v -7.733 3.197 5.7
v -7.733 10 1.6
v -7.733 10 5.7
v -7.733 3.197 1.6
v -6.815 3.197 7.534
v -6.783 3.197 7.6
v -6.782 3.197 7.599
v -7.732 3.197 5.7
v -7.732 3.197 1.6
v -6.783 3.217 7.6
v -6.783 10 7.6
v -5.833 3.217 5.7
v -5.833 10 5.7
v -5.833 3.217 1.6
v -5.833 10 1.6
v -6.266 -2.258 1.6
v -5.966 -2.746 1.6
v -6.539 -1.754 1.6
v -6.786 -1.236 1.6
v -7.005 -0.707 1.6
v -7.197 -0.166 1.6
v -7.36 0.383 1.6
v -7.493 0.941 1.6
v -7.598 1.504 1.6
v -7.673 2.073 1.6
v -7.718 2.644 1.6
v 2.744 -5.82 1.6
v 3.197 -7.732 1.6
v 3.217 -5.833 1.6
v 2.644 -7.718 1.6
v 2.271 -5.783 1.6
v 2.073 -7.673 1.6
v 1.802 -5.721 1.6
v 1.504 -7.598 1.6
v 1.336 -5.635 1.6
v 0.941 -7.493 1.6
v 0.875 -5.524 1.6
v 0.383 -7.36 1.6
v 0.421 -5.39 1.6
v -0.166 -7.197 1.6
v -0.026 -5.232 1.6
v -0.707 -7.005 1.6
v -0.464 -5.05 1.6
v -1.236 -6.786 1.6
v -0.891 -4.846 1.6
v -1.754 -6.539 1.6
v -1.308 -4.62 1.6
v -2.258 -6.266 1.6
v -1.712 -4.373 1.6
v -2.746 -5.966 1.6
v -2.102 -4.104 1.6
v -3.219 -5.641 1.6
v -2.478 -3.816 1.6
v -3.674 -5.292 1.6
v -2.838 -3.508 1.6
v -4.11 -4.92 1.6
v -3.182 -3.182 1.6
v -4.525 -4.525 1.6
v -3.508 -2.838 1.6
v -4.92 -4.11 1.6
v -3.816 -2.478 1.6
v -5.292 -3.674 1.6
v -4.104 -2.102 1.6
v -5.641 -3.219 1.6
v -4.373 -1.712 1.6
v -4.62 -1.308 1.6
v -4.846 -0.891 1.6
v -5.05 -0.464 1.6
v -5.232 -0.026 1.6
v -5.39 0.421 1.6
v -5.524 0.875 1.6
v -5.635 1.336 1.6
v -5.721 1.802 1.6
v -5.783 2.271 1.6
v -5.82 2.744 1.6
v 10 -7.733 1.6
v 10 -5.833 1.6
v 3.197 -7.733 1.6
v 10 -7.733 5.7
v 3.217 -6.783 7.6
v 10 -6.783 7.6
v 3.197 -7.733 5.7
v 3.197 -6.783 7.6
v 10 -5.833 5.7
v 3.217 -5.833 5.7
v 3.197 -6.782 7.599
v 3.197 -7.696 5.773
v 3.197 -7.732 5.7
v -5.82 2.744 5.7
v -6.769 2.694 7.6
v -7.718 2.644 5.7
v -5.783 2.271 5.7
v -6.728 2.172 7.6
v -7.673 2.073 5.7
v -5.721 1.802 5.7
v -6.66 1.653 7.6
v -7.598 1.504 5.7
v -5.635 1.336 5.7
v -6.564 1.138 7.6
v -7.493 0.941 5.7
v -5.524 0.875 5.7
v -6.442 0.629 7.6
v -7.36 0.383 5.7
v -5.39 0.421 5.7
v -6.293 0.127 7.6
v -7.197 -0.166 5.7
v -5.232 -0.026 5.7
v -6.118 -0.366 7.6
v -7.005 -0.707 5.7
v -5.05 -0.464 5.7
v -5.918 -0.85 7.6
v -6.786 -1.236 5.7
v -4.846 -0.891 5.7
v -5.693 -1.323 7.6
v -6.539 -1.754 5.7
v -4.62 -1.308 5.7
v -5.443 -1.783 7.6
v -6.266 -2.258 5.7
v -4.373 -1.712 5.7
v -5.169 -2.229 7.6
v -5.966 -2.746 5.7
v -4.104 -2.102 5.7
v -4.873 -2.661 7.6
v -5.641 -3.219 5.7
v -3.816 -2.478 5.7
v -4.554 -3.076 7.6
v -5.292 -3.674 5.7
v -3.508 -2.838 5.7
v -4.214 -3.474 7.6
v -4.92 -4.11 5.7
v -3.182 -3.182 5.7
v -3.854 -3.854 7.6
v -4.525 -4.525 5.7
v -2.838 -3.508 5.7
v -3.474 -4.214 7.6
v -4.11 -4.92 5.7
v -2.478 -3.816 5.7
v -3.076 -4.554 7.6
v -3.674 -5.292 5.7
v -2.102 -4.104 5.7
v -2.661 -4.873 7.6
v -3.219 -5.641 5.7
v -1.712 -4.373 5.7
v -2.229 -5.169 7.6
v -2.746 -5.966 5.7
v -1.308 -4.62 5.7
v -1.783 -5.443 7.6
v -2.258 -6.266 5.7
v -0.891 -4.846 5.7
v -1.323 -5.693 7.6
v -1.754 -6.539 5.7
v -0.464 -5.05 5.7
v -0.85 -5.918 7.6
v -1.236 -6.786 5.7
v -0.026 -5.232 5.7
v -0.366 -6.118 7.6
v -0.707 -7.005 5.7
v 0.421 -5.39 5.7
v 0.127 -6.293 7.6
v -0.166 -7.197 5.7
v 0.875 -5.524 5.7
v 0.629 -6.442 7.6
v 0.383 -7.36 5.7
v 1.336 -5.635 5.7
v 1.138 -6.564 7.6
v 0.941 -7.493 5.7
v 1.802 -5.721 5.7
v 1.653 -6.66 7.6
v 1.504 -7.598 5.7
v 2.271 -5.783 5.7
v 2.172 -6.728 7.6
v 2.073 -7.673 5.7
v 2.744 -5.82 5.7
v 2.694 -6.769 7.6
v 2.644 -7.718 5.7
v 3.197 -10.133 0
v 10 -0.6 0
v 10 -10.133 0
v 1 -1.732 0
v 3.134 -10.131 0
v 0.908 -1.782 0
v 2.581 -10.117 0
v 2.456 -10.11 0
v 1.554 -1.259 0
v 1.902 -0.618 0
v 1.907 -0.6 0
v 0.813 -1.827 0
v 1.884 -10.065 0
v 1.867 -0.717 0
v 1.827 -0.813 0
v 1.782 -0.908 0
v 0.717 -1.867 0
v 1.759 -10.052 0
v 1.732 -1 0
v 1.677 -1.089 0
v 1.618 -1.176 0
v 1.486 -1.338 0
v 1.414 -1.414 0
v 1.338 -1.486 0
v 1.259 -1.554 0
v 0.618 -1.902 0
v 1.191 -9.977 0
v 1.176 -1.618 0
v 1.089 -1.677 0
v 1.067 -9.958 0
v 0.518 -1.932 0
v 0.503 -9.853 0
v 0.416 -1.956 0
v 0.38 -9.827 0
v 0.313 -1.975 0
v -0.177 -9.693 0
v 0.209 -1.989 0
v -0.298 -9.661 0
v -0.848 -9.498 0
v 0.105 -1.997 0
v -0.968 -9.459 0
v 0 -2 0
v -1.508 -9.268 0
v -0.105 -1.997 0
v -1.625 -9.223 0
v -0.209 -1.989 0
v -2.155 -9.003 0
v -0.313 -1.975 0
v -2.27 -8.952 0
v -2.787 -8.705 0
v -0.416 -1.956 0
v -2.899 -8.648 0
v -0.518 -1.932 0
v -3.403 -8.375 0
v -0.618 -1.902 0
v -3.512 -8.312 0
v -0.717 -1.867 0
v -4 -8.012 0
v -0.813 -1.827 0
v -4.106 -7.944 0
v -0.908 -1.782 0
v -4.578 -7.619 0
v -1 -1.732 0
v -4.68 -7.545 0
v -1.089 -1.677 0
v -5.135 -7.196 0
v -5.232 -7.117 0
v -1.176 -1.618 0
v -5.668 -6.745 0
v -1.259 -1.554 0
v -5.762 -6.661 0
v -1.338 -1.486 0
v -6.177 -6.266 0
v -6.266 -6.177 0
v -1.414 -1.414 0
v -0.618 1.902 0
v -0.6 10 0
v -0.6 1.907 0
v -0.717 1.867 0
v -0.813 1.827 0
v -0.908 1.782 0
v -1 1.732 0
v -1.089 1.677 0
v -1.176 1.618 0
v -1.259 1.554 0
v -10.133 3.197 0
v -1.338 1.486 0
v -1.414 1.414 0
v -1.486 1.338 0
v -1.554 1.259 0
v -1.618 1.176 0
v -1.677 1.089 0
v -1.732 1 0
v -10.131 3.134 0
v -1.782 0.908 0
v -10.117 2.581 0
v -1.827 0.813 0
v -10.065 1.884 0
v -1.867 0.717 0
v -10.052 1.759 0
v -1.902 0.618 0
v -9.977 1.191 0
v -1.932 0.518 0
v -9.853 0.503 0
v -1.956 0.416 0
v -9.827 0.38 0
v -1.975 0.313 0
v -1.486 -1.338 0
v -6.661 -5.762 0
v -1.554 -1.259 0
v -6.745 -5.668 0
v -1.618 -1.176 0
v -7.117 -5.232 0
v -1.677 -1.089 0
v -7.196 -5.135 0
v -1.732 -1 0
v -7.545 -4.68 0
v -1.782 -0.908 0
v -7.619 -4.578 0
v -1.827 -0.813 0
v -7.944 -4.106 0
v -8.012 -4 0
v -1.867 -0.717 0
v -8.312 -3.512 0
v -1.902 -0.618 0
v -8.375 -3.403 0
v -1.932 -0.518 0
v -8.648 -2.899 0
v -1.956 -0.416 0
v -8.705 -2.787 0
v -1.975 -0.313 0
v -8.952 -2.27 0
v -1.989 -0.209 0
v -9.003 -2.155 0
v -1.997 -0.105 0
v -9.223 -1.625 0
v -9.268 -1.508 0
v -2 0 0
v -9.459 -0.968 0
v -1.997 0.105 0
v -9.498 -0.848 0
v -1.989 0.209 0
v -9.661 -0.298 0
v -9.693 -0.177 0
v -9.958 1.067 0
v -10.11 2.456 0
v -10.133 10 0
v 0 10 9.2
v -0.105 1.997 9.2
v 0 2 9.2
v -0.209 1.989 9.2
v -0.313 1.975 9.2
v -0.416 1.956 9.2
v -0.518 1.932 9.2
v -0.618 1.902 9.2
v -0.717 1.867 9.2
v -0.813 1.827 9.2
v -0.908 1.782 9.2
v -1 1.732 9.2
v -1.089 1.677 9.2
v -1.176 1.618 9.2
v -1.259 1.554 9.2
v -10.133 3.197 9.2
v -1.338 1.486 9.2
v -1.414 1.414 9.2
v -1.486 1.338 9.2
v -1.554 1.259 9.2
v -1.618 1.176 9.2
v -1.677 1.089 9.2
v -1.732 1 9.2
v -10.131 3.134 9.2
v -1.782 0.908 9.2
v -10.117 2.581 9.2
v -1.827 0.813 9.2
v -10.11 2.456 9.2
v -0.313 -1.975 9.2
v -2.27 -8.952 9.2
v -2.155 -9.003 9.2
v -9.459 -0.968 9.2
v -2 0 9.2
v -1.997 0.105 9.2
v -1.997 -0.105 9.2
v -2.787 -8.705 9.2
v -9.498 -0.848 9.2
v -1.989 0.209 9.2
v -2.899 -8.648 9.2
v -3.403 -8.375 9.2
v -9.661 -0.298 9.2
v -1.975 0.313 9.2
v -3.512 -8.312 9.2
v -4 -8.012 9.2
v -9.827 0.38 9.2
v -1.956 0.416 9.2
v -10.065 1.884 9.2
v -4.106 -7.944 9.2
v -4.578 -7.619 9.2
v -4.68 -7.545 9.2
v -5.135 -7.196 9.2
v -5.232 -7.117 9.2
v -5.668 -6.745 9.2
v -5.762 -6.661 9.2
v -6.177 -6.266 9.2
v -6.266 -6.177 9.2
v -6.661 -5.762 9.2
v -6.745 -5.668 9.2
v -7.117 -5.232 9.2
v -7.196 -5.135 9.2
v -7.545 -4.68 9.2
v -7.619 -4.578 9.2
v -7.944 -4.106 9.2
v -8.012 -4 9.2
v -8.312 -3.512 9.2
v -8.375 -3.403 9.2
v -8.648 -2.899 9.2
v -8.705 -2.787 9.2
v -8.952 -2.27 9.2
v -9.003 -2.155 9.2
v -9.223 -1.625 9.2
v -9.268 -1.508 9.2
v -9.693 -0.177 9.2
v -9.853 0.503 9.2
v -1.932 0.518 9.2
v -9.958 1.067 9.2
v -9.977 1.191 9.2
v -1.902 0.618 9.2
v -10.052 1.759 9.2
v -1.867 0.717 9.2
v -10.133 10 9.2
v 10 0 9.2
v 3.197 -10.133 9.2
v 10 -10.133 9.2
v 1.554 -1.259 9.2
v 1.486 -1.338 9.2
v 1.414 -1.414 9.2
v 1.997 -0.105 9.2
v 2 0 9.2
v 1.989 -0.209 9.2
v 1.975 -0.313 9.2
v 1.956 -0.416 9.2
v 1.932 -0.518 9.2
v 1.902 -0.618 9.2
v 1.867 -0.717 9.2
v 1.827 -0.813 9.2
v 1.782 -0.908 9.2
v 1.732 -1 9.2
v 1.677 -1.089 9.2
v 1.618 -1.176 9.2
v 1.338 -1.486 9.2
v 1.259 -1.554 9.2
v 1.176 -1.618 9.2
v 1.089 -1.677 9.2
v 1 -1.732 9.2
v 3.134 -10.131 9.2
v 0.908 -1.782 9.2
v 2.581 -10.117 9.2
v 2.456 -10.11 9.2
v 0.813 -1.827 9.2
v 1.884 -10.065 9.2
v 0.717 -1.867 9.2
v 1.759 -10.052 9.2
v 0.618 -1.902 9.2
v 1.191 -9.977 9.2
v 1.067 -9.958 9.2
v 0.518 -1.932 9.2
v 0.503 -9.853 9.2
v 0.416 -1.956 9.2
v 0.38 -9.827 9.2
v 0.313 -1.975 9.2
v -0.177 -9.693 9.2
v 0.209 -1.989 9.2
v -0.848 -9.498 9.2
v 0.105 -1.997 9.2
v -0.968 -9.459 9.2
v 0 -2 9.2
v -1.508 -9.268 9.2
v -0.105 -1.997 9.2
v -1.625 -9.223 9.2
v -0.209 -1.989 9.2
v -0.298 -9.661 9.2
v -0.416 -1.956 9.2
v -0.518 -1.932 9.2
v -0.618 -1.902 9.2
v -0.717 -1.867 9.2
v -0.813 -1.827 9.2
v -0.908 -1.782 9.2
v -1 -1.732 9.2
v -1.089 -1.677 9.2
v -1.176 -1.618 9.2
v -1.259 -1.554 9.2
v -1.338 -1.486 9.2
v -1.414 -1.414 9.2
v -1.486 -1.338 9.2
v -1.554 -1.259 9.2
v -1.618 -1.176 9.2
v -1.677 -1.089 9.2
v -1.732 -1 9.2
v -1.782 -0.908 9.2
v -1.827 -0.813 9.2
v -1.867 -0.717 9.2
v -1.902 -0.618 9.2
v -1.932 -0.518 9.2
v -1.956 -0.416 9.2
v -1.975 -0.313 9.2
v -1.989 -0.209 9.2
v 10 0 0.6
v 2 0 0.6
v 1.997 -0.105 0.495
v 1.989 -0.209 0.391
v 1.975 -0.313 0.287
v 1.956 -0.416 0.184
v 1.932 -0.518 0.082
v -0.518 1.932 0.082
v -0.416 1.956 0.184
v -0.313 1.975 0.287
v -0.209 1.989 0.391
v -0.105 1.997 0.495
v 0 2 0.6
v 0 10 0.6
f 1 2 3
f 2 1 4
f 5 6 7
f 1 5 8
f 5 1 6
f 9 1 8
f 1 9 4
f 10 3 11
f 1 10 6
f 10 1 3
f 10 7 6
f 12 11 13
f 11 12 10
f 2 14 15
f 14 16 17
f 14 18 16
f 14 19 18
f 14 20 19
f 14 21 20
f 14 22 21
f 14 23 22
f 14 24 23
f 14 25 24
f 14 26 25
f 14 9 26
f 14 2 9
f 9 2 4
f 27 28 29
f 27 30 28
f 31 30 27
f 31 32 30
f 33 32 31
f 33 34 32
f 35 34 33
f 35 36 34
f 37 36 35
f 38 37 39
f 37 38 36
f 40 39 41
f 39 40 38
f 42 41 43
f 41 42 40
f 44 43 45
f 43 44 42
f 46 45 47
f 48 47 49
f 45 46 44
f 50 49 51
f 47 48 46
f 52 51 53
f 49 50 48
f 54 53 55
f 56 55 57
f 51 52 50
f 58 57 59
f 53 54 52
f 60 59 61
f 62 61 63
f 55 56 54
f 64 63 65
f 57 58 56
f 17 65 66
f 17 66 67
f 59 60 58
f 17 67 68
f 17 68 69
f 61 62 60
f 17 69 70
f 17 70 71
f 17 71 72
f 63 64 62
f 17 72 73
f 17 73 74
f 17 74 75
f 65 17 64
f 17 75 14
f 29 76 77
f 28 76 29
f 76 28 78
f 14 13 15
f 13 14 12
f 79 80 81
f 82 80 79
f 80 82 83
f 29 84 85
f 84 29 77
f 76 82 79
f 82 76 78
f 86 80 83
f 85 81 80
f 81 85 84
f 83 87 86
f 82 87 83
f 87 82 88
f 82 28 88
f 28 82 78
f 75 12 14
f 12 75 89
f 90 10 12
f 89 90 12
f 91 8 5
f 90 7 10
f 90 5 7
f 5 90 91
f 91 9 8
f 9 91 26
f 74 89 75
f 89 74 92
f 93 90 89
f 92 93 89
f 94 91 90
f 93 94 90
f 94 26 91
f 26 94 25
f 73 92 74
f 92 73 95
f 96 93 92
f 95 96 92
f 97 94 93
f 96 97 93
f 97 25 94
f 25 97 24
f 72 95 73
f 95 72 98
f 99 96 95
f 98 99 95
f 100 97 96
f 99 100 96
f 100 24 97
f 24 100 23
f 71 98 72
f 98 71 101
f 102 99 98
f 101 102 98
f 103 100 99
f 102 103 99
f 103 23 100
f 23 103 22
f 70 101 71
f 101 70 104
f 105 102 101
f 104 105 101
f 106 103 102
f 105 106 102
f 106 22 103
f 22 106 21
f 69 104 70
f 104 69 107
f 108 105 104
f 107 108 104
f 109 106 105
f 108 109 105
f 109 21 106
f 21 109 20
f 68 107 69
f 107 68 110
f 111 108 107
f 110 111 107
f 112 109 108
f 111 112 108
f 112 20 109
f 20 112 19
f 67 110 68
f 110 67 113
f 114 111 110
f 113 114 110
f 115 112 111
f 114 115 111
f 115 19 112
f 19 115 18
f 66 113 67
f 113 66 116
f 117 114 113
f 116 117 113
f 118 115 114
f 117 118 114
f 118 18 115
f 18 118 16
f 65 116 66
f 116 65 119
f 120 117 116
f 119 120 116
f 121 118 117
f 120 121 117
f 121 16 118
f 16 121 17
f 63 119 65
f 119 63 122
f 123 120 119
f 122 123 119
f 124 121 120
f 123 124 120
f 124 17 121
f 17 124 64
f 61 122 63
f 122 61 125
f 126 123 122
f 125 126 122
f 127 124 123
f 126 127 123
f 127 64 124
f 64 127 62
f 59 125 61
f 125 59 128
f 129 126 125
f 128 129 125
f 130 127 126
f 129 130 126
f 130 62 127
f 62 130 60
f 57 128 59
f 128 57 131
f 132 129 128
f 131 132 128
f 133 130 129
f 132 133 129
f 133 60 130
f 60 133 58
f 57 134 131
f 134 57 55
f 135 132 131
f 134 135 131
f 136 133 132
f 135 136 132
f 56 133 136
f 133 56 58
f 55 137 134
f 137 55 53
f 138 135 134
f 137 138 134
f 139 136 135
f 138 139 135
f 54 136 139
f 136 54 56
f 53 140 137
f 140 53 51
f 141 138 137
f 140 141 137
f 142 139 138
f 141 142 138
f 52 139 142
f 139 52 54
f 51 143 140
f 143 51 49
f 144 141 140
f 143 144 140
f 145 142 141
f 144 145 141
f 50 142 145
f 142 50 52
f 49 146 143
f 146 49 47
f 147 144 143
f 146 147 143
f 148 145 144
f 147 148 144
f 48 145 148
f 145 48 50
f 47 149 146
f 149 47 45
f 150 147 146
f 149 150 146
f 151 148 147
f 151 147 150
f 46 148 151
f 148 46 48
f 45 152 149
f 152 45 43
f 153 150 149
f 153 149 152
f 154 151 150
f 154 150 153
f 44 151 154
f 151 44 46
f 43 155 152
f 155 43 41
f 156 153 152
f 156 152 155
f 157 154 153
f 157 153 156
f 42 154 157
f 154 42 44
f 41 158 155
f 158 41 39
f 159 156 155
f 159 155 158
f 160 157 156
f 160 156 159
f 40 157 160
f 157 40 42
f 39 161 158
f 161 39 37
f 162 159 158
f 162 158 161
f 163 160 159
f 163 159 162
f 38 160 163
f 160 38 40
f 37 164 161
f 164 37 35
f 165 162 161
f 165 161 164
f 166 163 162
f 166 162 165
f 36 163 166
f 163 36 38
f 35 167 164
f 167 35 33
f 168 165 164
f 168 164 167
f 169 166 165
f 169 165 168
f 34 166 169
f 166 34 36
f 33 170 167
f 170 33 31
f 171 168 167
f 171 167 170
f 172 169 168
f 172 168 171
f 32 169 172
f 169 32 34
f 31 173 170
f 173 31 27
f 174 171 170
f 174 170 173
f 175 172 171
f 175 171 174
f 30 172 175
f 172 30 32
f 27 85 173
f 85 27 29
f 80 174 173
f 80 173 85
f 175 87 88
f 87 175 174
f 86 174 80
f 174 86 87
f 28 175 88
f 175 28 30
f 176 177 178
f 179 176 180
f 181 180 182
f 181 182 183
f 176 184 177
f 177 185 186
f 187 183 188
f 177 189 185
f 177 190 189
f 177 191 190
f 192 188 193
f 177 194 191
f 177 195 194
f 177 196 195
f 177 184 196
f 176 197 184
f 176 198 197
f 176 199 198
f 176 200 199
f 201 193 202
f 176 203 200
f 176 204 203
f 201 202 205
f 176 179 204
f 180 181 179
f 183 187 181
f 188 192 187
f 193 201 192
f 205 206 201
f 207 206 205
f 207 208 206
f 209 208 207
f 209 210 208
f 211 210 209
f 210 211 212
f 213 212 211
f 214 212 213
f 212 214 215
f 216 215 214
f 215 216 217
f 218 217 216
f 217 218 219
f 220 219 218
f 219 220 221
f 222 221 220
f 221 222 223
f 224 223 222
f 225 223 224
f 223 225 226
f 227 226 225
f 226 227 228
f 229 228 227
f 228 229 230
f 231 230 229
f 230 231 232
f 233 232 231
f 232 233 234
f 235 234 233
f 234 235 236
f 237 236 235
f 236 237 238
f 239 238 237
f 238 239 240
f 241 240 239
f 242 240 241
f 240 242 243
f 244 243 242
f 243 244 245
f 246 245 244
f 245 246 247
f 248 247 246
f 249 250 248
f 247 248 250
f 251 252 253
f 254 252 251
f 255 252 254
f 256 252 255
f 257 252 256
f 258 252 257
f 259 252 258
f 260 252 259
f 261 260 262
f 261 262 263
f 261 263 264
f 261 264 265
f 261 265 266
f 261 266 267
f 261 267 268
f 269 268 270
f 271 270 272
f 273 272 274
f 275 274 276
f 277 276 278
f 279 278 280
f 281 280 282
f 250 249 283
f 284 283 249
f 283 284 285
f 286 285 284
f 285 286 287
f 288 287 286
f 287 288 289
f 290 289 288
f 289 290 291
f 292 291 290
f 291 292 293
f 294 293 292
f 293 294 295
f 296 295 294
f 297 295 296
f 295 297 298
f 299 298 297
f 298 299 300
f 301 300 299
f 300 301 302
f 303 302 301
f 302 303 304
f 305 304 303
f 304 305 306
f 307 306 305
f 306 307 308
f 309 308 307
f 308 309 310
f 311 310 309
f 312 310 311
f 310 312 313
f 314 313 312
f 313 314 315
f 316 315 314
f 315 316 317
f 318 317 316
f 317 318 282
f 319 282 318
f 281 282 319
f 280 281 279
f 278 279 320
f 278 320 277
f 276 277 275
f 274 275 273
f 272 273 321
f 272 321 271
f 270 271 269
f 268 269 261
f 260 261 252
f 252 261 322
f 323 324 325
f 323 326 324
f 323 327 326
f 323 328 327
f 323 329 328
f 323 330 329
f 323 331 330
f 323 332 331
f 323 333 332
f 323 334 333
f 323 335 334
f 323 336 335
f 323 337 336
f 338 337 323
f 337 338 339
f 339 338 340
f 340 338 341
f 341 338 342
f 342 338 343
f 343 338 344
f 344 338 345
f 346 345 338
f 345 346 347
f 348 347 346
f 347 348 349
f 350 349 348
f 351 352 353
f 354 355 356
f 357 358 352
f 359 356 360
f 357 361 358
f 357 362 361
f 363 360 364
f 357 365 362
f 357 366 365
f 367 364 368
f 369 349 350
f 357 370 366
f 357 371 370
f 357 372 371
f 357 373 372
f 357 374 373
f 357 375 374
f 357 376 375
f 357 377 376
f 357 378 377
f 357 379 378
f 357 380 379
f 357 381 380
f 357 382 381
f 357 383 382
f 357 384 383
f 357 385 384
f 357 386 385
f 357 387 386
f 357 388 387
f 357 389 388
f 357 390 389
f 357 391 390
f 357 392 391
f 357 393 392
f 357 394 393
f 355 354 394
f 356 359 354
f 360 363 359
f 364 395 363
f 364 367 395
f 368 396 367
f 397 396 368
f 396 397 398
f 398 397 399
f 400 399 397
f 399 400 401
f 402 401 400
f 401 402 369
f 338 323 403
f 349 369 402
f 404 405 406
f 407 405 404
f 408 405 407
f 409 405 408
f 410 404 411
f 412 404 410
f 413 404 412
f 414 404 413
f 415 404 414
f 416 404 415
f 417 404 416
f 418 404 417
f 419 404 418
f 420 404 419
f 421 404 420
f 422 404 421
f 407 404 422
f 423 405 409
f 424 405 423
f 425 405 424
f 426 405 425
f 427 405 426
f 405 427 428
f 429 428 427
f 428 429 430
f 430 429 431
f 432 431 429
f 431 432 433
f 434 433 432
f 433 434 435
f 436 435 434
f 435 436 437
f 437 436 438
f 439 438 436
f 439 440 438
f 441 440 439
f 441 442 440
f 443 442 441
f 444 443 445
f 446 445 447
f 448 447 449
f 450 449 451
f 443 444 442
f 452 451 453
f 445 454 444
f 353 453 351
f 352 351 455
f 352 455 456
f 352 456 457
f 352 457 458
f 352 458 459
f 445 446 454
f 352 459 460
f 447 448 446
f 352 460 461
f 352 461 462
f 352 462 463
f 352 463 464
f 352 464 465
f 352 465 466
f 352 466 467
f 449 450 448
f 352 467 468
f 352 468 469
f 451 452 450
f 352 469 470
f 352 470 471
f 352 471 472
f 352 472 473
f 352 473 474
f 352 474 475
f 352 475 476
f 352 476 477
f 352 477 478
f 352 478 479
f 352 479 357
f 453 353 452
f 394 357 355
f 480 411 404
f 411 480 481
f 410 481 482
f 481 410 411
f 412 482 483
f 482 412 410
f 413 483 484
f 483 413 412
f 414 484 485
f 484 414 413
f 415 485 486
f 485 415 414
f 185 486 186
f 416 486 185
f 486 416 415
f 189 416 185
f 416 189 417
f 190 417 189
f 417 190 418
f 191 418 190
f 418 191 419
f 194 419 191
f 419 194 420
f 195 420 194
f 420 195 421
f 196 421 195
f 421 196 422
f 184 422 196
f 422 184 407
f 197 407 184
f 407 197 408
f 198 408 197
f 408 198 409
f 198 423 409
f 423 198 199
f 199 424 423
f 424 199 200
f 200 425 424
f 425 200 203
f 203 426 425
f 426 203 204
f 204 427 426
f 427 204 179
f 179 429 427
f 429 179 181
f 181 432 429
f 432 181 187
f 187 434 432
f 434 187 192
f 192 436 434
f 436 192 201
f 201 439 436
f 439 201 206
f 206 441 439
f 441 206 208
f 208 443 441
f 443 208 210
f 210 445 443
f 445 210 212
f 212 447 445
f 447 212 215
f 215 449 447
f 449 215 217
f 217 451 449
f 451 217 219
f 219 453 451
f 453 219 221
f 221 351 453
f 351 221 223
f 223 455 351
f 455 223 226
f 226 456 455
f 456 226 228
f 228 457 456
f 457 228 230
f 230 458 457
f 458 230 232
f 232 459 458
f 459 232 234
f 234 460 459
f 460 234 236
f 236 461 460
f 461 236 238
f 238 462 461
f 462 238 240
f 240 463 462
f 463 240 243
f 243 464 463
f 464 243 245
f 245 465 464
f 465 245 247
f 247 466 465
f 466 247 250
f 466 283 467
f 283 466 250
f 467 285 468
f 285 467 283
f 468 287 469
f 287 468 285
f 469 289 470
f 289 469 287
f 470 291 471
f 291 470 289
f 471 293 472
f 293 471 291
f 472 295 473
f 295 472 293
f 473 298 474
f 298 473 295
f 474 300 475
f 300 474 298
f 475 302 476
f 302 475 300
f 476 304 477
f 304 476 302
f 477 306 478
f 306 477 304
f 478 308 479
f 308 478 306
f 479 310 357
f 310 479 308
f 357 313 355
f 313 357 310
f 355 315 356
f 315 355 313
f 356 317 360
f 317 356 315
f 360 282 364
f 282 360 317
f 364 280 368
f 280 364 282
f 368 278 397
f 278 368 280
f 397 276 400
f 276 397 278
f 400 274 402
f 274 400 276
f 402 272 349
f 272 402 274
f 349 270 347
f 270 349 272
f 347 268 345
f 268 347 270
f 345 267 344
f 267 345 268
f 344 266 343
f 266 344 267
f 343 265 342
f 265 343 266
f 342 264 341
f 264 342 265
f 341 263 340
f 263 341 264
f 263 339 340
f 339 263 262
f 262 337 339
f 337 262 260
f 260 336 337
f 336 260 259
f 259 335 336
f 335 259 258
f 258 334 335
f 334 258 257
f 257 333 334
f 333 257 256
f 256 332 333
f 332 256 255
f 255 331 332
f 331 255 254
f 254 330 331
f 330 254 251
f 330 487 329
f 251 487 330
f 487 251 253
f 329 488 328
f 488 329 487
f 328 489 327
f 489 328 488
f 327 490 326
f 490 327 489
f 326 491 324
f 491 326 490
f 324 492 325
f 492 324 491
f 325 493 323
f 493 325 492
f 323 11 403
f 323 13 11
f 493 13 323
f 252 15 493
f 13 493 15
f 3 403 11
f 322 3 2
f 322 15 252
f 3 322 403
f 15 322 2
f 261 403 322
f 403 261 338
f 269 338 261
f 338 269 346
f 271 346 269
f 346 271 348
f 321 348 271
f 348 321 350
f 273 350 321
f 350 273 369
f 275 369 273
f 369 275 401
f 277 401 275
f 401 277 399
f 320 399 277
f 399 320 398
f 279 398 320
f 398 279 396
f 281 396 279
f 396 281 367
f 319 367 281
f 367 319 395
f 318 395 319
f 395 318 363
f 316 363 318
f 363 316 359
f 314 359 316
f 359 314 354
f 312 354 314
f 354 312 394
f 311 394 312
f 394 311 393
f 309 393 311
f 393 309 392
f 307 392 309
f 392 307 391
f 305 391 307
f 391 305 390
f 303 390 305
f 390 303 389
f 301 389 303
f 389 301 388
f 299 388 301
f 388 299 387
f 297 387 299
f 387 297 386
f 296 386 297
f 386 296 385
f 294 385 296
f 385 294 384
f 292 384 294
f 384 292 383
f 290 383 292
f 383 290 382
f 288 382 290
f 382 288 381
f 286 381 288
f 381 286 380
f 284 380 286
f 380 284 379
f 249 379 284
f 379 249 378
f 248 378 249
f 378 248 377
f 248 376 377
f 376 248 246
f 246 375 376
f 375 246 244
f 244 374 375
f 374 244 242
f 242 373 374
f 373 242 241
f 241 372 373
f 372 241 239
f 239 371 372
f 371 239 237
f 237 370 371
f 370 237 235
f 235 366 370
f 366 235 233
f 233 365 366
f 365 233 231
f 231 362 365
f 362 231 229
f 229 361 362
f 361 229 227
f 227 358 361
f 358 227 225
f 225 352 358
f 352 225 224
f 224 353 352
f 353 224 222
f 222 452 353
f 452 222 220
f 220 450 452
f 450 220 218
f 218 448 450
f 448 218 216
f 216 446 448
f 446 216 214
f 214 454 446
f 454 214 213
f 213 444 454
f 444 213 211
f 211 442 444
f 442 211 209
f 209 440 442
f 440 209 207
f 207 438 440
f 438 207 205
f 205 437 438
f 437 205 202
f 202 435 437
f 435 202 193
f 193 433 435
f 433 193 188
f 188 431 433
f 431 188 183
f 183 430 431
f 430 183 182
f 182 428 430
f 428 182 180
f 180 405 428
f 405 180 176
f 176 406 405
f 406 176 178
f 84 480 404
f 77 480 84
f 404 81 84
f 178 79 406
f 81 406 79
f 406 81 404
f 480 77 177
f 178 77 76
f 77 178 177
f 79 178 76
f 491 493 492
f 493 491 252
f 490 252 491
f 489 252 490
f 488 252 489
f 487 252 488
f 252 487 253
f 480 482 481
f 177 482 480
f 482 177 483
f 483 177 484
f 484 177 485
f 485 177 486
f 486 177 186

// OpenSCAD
// SPDX-License-Identifier: CC-BY-4.0
// SPDX-FileCopyrightText: 2026 Todd Sayre
// ============================================================
// Zip tie corner blocks — a corner shoe that carries a zip
// tie around a square object without letting it grab the
// corner
//
// A zip tie pulled around a square object touches it at four
// points, one per corner. The tie tries to be a circle, the
// object is a square, and what is left is a squircle with the
// square inscribed in it: all the tension lands on four
// corners, and the tie itself is what digs into them.
//
// This block sits on one corner. It is a thick right angle
// with two flat inner faces that bear on the object's two
// flats, and a curved channel running through it that the tie
// is threaded through. The tie is still allowed to take the
// curve it wants — it just takes it inside the channel, and
// the block turns that curve into pressure spread along the
// two flats. Four of them make the tie a rounded square
// instead of a squircle.
//
// A circular relief is knocked out of the inner corner so the
// block never bears on the corner itself. A printed internal
// corner is never sharp, and a real corner may carry a weld, a
// seam, an extrusion line, a fold of tape or a dent. Relieved,
// the block seats on the two flats and ignores all of it.
//
// The channel is a tunnel rather than an open groove, so the
// tie cannot fall out while everything is still slack. Thread
// the tail through all four blocks before feeding it into the
// head.
//
// THE ONE THING THAT IS NOT OBVIOUS: a gentler bend passes
// CLOSER to the corner. The tie's path has to leave each block
// running parallel to the flat it came off, so the corner arc
// is tangent to two lines offset from the flats. Grow that
// arc's radius and it stops hugging the corner and starts
// cutting across it — at bend_radius = tie_offset * (2 +
// sqrt(2)) the arc would pass straight through the corner
// itself. So the block buys room for a bigger radius the only
// way it can: by standing the whole channel further off the
// flats. A gentle bend is a thick block, and that is a
// straight trade, not a bug. face_offset is echoed so the cost
// is visible before printing.
//
// Modeled in its print orientation: corner edge vertical, one
// flat face on the plate.
//
// This source emits ONE block. Print four.
//
// A TPU sleeve for the inner faces sits beside this file. It
// is optional — the block works bare — and it adds grip and
// keeps the block's edges off the finish. Fitted, it stands
// the block off each flat by its own pad thickness, so the tie
// rides that much higher than the offset echoed here. Its
// source carries copies of the parameters below that decide
// how big it has to be, so change one of those and change it
// in both files.
//
// PRINT NOTES:
// - PETG, PLA or ASA, no supports needed.
// - Print as modeled, flat face down, corner edge vertical.
//   The channel roof is a gable at 26.6 deg from vertical, so
//   the tunnel needs no bridging, and every other face in the
//   part is vertical, on the plate, or facing up.
// - The layers then run across the block rather than along the
//   channel, which puts the tie's pull in the layer plane
//   instead of across the layer lines.
// - 3 or 4 perimeters and 30% infill or more. The corner web
//   between the relief and the channel is the piece the tie
//   presses on, and it is only corner_web thick.
// - The bottom edge of each inner face is chamfered at 45 deg
//   so an elephant foot cannot rock the block off the flats.
// - The tie's head does not fit through the channel and is not
//   meant to. Thread the tail through all four blocks, then
//   into the head, and let the head sit on a flat between two
//   blocks.
// ============================================================

// MARK: Dimensions

// Measure the zip tie
tie_width = 3.5; // mm, across the flat of the strap
tie_thickness = 1.3; // mm, over the ratchet teeth

// Size the block
bend_radius = 10; // mm, the tie's bend at mid-strap
leg_length = 10; // mm, along each flat from the corner
corner_relief_d = 4; // mm, open it up for a weld bead
// (bend_radius cannot go below the echoed min_bend_radius)

// MARK: Tuning

tie_clearance = 0.6; // mm, on both channel dimensions
corner_web = 2.5; // mm, between the relief and the channel
outer_wall = 2.4; // mm, outside the channel
deck = 1.6; // mm, under the channel floor and over the gable peak
foot_chamfer = 0.6; // mm, clears an elephant foot

$fn = 120;

// MARK: Derived

slot_w = tie_thickness + tie_clearance; // Channel across the strap's thickness, radially
slot_h = tie_width + tie_clearance; // Channel across the strap's width, vertically
relief_r = corner_relief_d / 2;

// Rise of the gable over the channel. It is the full slot width against a half
// slot width of run, so each roof face sits at 26.6 deg from vertical whatever
// the tie measures — no value of tie_thickness can turn this into a bridge
gable = slot_w;

block_h = 2 * deck + slot_h + gable;

// Tightest bend the corner can hold: the arc is concentric with the corner,
// and the material inside it is exactly the relief plus the web
min_bend_radius = slot_w / 2 + relief_r + corner_web;

// Standoff of the middle of the strap from each flat. Solved from the corner
// instead of chosen: the middle of the arc runs
// sqrt(2) * tie_offset - (sqrt(2) - 1) * bend_radius from the corner, and half
// a slot in from that is the wall that has to leave the relief and the web
// intact. A bigger bend_radius pushes the whole channel off the flats to pay
// for itself
tie_offset = ((sqrt(2) - 1) * bend_radius + slot_w / 2 + relief_r + corner_web) / sqrt(2);

// Material between the channel and each flat, and so the height the tie stands
// off the object along the runs between blocks
face_offset = tie_offset - slot_w / 2;

leg_thickness = face_offset + slot_w + outer_wall;

// Where the arc's centre sits, on the diagonal inside the object, and equally
// the distance from the corner to each tangent point. The channel is straight
// from there out to the mouth, which is what makes the tie leave parallel to
// the flat
arc_c = bend_radius - tie_offset;

straight_run = leg_length - arc_c;
contact_length = leg_length - relief_r;

// Shortest flat the blocks fit on: two of them, corner to corner, with nothing
// left between. Anything at or near this is too short in practice — leave room
// for the tie's head as well
min_object_side = 2 * leg_length;

// What four blocks add to the tie's loop over the bare perimeter of the
// object: four 90 deg arcs instead of four sharp corners, less the straight
// run each arc replaces
tie_path_extra = 2 * PI * bend_radius - 8 * arc_c;

mouth_over = 1; // Overshoot past the end faces, so the channel cuts through cleanly
seam = 0.02; // Overlap where the straight runs meet the arc

// Channel cross section, drawn in the plane the path is swept along: x is
// across the strap's thickness, y is up. Square where the tie sits, gabled
// above it so the roof carries itself
channel_profile = [
  [-slot_w / 2, 0],
  [slot_w / 2, 0],
  [slot_w / 2, slot_h],
  [0, slot_h + gable],
  [-slot_w / 2, slot_h],
];

// MARK: Checks

echo(str("block = ", leg_thickness + leg_length, " x ", leg_thickness + leg_length, " x ", block_h, " mm"));
echo(str("leg thickness = ", leg_thickness, " mm"));
echo(str("channel = ", slot_w, " mm across the strap by ", slot_h, " mm tall"));
echo(str("tie stands off each flat by = ", face_offset, " mm"));
echo(str("bearing length per flat = ", contact_length, " mm"));
echo(str("straight run at each mouth = ", straight_run, " mm"));
echo(str("smallest bend_radius this tie and relief allow = ", min_bend_radius, " mm"));
echo(str("shortest object flat two blocks fit on = ", min_object_side, " mm"));
echo(str("tie loop needed = 4 x the object's side + ", tie_path_extra, " mm"));

assert(bend_radius >= min_bend_radius, "bend_radius is tighter than the corner can hold — the arc would cut into the relief. Raise bend_radius to min_bend_radius or above, or take it out of corner_relief_d or corner_web");
assert(straight_run > 0, "leg_length stops short of the tangent point, so the channel would open mid-bend and aim the tie across the flat instead of along it — lengthen leg_length or reduce bend_radius");
assert(contact_length > 0, "the corner relief has eaten the whole bearing face — lengthen leg_length or reduce corner_relief_d");
assert(corner_web > 0, "corner_web has to be positive — the tie pulls against it");
assert(slot_w > 0 && slot_h > 0, "tie_clearance has closed the channel — it cannot be more negative than the tie is thick");
assert(foot_chamfer < face_offset, "the foot chamfer has reached the channel — reduce foot_chamfer, or raise bend_radius to stand the channel further off the flats");
assert(foot_chamfer < deck, "the foot chamfer has reached the channel floor — reduce foot_chamfer or add deck");
assert(relief_r < leg_thickness, "the corner relief is wider than the block is thick — reduce corner_relief_d");

// MARK: Geometry

// One leg's straight run, in plan. The other leg is this one mirrored across
// the diagonal, so the two can never drift apart
module channel_leg_2d() {
  translate([-tie_offset - slot_w / 2, arc_c - seam])
    square([slot_w, leg_length + mouth_over - arc_c + seam]);
}

// The 90 deg bend, in plan: a quarter of an annulus centred on the diagonal,
// tangent to both straight runs where it meets them
module channel_arc_2d() {
  reach = bend_radius + slot_w;
  translate([arc_c, arc_c])
    intersection() {
      difference() {
        circle(r = bend_radius + slot_w / 2);
        circle(r = bend_radius - slot_w / 2);
      }
      translate([-reach, -reach])
        square(reach);
    }
}

module channel_2d() {
  channel_leg_2d();
  mirror([1, -1, 0])
    channel_leg_2d();
  channel_arc_2d();
}

// The skin between one leg's channel and the flat it lies against
module inner_skin_2d() {
  translate([-face_offset, 0])
    square([face_offset, leg_length]);
}

// Plan of the block: the channel wrapped in material, clipped back to the
// legs, with the object's own quadrant and the corner relief taken out. The
// disc fills everything inside the bend, which is where the corner web comes
// from — it is tangent to both inner walls, so it never reaches past them
module body_2d() {
  difference() {
    intersection() {
      union() {
        offset(r = outer_wall)
          channel_2d();
        inner_skin_2d();
        mirror([1, -1, 0])
          inner_skin_2d();
        translate([arc_c, arc_c])
          circle(r = bend_radius - slot_w / 2);
      }
      translate([-leg_thickness, -leg_thickness])
        square(leg_thickness + leg_length);
    }

    // The object's corner occupies this quadrant
    square(leg_length + 1);

    // Corner relief, so the block bears on the flats and never on the corner
    circle(r = relief_r);
  }
}

module channel_leg_3d() {
  translate([-tie_offset, leg_length + mouth_over, deck])
    rotate([90, 0, 0])
      linear_extrude(leg_length + mouth_over - arc_c + seam)
        polygon(channel_profile);
}

module channel_arc_3d() {
  translate([arc_c, arc_c, deck])
    rotate([0, 0, 180])
      rotate_extrude(angle = 90)
        translate([bend_radius, 0])
          polygon(channel_profile);
}

module channel_3d() {
  channel_leg_3d();
  mirror([1, -1, 0])
    channel_leg_3d();
  channel_arc_3d();
}

// Chamfer along the bottom edge of one inner face. Its run and rise are the
// same expression, so it is 45 deg whatever foot_chamfer is set to
module foot_chamfer_3d() {
  translate([0, leg_length + 1, 0])
    rotate([90, 0, 0])
      linear_extrude(leg_length + 1)
        polygon([
          [0, 0],
          [-foot_chamfer, 0],
          [0, foot_chamfer]
        ]);
}

module zip_tie_corner_block() {
  difference() {
    linear_extrude(block_h)
      body_2d();
    channel_3d();
    foot_chamfer_3d();
    mirror([1, -1, 0])
      foot_chamfer_3d();
  }
}

zip_tie_corner_block();
